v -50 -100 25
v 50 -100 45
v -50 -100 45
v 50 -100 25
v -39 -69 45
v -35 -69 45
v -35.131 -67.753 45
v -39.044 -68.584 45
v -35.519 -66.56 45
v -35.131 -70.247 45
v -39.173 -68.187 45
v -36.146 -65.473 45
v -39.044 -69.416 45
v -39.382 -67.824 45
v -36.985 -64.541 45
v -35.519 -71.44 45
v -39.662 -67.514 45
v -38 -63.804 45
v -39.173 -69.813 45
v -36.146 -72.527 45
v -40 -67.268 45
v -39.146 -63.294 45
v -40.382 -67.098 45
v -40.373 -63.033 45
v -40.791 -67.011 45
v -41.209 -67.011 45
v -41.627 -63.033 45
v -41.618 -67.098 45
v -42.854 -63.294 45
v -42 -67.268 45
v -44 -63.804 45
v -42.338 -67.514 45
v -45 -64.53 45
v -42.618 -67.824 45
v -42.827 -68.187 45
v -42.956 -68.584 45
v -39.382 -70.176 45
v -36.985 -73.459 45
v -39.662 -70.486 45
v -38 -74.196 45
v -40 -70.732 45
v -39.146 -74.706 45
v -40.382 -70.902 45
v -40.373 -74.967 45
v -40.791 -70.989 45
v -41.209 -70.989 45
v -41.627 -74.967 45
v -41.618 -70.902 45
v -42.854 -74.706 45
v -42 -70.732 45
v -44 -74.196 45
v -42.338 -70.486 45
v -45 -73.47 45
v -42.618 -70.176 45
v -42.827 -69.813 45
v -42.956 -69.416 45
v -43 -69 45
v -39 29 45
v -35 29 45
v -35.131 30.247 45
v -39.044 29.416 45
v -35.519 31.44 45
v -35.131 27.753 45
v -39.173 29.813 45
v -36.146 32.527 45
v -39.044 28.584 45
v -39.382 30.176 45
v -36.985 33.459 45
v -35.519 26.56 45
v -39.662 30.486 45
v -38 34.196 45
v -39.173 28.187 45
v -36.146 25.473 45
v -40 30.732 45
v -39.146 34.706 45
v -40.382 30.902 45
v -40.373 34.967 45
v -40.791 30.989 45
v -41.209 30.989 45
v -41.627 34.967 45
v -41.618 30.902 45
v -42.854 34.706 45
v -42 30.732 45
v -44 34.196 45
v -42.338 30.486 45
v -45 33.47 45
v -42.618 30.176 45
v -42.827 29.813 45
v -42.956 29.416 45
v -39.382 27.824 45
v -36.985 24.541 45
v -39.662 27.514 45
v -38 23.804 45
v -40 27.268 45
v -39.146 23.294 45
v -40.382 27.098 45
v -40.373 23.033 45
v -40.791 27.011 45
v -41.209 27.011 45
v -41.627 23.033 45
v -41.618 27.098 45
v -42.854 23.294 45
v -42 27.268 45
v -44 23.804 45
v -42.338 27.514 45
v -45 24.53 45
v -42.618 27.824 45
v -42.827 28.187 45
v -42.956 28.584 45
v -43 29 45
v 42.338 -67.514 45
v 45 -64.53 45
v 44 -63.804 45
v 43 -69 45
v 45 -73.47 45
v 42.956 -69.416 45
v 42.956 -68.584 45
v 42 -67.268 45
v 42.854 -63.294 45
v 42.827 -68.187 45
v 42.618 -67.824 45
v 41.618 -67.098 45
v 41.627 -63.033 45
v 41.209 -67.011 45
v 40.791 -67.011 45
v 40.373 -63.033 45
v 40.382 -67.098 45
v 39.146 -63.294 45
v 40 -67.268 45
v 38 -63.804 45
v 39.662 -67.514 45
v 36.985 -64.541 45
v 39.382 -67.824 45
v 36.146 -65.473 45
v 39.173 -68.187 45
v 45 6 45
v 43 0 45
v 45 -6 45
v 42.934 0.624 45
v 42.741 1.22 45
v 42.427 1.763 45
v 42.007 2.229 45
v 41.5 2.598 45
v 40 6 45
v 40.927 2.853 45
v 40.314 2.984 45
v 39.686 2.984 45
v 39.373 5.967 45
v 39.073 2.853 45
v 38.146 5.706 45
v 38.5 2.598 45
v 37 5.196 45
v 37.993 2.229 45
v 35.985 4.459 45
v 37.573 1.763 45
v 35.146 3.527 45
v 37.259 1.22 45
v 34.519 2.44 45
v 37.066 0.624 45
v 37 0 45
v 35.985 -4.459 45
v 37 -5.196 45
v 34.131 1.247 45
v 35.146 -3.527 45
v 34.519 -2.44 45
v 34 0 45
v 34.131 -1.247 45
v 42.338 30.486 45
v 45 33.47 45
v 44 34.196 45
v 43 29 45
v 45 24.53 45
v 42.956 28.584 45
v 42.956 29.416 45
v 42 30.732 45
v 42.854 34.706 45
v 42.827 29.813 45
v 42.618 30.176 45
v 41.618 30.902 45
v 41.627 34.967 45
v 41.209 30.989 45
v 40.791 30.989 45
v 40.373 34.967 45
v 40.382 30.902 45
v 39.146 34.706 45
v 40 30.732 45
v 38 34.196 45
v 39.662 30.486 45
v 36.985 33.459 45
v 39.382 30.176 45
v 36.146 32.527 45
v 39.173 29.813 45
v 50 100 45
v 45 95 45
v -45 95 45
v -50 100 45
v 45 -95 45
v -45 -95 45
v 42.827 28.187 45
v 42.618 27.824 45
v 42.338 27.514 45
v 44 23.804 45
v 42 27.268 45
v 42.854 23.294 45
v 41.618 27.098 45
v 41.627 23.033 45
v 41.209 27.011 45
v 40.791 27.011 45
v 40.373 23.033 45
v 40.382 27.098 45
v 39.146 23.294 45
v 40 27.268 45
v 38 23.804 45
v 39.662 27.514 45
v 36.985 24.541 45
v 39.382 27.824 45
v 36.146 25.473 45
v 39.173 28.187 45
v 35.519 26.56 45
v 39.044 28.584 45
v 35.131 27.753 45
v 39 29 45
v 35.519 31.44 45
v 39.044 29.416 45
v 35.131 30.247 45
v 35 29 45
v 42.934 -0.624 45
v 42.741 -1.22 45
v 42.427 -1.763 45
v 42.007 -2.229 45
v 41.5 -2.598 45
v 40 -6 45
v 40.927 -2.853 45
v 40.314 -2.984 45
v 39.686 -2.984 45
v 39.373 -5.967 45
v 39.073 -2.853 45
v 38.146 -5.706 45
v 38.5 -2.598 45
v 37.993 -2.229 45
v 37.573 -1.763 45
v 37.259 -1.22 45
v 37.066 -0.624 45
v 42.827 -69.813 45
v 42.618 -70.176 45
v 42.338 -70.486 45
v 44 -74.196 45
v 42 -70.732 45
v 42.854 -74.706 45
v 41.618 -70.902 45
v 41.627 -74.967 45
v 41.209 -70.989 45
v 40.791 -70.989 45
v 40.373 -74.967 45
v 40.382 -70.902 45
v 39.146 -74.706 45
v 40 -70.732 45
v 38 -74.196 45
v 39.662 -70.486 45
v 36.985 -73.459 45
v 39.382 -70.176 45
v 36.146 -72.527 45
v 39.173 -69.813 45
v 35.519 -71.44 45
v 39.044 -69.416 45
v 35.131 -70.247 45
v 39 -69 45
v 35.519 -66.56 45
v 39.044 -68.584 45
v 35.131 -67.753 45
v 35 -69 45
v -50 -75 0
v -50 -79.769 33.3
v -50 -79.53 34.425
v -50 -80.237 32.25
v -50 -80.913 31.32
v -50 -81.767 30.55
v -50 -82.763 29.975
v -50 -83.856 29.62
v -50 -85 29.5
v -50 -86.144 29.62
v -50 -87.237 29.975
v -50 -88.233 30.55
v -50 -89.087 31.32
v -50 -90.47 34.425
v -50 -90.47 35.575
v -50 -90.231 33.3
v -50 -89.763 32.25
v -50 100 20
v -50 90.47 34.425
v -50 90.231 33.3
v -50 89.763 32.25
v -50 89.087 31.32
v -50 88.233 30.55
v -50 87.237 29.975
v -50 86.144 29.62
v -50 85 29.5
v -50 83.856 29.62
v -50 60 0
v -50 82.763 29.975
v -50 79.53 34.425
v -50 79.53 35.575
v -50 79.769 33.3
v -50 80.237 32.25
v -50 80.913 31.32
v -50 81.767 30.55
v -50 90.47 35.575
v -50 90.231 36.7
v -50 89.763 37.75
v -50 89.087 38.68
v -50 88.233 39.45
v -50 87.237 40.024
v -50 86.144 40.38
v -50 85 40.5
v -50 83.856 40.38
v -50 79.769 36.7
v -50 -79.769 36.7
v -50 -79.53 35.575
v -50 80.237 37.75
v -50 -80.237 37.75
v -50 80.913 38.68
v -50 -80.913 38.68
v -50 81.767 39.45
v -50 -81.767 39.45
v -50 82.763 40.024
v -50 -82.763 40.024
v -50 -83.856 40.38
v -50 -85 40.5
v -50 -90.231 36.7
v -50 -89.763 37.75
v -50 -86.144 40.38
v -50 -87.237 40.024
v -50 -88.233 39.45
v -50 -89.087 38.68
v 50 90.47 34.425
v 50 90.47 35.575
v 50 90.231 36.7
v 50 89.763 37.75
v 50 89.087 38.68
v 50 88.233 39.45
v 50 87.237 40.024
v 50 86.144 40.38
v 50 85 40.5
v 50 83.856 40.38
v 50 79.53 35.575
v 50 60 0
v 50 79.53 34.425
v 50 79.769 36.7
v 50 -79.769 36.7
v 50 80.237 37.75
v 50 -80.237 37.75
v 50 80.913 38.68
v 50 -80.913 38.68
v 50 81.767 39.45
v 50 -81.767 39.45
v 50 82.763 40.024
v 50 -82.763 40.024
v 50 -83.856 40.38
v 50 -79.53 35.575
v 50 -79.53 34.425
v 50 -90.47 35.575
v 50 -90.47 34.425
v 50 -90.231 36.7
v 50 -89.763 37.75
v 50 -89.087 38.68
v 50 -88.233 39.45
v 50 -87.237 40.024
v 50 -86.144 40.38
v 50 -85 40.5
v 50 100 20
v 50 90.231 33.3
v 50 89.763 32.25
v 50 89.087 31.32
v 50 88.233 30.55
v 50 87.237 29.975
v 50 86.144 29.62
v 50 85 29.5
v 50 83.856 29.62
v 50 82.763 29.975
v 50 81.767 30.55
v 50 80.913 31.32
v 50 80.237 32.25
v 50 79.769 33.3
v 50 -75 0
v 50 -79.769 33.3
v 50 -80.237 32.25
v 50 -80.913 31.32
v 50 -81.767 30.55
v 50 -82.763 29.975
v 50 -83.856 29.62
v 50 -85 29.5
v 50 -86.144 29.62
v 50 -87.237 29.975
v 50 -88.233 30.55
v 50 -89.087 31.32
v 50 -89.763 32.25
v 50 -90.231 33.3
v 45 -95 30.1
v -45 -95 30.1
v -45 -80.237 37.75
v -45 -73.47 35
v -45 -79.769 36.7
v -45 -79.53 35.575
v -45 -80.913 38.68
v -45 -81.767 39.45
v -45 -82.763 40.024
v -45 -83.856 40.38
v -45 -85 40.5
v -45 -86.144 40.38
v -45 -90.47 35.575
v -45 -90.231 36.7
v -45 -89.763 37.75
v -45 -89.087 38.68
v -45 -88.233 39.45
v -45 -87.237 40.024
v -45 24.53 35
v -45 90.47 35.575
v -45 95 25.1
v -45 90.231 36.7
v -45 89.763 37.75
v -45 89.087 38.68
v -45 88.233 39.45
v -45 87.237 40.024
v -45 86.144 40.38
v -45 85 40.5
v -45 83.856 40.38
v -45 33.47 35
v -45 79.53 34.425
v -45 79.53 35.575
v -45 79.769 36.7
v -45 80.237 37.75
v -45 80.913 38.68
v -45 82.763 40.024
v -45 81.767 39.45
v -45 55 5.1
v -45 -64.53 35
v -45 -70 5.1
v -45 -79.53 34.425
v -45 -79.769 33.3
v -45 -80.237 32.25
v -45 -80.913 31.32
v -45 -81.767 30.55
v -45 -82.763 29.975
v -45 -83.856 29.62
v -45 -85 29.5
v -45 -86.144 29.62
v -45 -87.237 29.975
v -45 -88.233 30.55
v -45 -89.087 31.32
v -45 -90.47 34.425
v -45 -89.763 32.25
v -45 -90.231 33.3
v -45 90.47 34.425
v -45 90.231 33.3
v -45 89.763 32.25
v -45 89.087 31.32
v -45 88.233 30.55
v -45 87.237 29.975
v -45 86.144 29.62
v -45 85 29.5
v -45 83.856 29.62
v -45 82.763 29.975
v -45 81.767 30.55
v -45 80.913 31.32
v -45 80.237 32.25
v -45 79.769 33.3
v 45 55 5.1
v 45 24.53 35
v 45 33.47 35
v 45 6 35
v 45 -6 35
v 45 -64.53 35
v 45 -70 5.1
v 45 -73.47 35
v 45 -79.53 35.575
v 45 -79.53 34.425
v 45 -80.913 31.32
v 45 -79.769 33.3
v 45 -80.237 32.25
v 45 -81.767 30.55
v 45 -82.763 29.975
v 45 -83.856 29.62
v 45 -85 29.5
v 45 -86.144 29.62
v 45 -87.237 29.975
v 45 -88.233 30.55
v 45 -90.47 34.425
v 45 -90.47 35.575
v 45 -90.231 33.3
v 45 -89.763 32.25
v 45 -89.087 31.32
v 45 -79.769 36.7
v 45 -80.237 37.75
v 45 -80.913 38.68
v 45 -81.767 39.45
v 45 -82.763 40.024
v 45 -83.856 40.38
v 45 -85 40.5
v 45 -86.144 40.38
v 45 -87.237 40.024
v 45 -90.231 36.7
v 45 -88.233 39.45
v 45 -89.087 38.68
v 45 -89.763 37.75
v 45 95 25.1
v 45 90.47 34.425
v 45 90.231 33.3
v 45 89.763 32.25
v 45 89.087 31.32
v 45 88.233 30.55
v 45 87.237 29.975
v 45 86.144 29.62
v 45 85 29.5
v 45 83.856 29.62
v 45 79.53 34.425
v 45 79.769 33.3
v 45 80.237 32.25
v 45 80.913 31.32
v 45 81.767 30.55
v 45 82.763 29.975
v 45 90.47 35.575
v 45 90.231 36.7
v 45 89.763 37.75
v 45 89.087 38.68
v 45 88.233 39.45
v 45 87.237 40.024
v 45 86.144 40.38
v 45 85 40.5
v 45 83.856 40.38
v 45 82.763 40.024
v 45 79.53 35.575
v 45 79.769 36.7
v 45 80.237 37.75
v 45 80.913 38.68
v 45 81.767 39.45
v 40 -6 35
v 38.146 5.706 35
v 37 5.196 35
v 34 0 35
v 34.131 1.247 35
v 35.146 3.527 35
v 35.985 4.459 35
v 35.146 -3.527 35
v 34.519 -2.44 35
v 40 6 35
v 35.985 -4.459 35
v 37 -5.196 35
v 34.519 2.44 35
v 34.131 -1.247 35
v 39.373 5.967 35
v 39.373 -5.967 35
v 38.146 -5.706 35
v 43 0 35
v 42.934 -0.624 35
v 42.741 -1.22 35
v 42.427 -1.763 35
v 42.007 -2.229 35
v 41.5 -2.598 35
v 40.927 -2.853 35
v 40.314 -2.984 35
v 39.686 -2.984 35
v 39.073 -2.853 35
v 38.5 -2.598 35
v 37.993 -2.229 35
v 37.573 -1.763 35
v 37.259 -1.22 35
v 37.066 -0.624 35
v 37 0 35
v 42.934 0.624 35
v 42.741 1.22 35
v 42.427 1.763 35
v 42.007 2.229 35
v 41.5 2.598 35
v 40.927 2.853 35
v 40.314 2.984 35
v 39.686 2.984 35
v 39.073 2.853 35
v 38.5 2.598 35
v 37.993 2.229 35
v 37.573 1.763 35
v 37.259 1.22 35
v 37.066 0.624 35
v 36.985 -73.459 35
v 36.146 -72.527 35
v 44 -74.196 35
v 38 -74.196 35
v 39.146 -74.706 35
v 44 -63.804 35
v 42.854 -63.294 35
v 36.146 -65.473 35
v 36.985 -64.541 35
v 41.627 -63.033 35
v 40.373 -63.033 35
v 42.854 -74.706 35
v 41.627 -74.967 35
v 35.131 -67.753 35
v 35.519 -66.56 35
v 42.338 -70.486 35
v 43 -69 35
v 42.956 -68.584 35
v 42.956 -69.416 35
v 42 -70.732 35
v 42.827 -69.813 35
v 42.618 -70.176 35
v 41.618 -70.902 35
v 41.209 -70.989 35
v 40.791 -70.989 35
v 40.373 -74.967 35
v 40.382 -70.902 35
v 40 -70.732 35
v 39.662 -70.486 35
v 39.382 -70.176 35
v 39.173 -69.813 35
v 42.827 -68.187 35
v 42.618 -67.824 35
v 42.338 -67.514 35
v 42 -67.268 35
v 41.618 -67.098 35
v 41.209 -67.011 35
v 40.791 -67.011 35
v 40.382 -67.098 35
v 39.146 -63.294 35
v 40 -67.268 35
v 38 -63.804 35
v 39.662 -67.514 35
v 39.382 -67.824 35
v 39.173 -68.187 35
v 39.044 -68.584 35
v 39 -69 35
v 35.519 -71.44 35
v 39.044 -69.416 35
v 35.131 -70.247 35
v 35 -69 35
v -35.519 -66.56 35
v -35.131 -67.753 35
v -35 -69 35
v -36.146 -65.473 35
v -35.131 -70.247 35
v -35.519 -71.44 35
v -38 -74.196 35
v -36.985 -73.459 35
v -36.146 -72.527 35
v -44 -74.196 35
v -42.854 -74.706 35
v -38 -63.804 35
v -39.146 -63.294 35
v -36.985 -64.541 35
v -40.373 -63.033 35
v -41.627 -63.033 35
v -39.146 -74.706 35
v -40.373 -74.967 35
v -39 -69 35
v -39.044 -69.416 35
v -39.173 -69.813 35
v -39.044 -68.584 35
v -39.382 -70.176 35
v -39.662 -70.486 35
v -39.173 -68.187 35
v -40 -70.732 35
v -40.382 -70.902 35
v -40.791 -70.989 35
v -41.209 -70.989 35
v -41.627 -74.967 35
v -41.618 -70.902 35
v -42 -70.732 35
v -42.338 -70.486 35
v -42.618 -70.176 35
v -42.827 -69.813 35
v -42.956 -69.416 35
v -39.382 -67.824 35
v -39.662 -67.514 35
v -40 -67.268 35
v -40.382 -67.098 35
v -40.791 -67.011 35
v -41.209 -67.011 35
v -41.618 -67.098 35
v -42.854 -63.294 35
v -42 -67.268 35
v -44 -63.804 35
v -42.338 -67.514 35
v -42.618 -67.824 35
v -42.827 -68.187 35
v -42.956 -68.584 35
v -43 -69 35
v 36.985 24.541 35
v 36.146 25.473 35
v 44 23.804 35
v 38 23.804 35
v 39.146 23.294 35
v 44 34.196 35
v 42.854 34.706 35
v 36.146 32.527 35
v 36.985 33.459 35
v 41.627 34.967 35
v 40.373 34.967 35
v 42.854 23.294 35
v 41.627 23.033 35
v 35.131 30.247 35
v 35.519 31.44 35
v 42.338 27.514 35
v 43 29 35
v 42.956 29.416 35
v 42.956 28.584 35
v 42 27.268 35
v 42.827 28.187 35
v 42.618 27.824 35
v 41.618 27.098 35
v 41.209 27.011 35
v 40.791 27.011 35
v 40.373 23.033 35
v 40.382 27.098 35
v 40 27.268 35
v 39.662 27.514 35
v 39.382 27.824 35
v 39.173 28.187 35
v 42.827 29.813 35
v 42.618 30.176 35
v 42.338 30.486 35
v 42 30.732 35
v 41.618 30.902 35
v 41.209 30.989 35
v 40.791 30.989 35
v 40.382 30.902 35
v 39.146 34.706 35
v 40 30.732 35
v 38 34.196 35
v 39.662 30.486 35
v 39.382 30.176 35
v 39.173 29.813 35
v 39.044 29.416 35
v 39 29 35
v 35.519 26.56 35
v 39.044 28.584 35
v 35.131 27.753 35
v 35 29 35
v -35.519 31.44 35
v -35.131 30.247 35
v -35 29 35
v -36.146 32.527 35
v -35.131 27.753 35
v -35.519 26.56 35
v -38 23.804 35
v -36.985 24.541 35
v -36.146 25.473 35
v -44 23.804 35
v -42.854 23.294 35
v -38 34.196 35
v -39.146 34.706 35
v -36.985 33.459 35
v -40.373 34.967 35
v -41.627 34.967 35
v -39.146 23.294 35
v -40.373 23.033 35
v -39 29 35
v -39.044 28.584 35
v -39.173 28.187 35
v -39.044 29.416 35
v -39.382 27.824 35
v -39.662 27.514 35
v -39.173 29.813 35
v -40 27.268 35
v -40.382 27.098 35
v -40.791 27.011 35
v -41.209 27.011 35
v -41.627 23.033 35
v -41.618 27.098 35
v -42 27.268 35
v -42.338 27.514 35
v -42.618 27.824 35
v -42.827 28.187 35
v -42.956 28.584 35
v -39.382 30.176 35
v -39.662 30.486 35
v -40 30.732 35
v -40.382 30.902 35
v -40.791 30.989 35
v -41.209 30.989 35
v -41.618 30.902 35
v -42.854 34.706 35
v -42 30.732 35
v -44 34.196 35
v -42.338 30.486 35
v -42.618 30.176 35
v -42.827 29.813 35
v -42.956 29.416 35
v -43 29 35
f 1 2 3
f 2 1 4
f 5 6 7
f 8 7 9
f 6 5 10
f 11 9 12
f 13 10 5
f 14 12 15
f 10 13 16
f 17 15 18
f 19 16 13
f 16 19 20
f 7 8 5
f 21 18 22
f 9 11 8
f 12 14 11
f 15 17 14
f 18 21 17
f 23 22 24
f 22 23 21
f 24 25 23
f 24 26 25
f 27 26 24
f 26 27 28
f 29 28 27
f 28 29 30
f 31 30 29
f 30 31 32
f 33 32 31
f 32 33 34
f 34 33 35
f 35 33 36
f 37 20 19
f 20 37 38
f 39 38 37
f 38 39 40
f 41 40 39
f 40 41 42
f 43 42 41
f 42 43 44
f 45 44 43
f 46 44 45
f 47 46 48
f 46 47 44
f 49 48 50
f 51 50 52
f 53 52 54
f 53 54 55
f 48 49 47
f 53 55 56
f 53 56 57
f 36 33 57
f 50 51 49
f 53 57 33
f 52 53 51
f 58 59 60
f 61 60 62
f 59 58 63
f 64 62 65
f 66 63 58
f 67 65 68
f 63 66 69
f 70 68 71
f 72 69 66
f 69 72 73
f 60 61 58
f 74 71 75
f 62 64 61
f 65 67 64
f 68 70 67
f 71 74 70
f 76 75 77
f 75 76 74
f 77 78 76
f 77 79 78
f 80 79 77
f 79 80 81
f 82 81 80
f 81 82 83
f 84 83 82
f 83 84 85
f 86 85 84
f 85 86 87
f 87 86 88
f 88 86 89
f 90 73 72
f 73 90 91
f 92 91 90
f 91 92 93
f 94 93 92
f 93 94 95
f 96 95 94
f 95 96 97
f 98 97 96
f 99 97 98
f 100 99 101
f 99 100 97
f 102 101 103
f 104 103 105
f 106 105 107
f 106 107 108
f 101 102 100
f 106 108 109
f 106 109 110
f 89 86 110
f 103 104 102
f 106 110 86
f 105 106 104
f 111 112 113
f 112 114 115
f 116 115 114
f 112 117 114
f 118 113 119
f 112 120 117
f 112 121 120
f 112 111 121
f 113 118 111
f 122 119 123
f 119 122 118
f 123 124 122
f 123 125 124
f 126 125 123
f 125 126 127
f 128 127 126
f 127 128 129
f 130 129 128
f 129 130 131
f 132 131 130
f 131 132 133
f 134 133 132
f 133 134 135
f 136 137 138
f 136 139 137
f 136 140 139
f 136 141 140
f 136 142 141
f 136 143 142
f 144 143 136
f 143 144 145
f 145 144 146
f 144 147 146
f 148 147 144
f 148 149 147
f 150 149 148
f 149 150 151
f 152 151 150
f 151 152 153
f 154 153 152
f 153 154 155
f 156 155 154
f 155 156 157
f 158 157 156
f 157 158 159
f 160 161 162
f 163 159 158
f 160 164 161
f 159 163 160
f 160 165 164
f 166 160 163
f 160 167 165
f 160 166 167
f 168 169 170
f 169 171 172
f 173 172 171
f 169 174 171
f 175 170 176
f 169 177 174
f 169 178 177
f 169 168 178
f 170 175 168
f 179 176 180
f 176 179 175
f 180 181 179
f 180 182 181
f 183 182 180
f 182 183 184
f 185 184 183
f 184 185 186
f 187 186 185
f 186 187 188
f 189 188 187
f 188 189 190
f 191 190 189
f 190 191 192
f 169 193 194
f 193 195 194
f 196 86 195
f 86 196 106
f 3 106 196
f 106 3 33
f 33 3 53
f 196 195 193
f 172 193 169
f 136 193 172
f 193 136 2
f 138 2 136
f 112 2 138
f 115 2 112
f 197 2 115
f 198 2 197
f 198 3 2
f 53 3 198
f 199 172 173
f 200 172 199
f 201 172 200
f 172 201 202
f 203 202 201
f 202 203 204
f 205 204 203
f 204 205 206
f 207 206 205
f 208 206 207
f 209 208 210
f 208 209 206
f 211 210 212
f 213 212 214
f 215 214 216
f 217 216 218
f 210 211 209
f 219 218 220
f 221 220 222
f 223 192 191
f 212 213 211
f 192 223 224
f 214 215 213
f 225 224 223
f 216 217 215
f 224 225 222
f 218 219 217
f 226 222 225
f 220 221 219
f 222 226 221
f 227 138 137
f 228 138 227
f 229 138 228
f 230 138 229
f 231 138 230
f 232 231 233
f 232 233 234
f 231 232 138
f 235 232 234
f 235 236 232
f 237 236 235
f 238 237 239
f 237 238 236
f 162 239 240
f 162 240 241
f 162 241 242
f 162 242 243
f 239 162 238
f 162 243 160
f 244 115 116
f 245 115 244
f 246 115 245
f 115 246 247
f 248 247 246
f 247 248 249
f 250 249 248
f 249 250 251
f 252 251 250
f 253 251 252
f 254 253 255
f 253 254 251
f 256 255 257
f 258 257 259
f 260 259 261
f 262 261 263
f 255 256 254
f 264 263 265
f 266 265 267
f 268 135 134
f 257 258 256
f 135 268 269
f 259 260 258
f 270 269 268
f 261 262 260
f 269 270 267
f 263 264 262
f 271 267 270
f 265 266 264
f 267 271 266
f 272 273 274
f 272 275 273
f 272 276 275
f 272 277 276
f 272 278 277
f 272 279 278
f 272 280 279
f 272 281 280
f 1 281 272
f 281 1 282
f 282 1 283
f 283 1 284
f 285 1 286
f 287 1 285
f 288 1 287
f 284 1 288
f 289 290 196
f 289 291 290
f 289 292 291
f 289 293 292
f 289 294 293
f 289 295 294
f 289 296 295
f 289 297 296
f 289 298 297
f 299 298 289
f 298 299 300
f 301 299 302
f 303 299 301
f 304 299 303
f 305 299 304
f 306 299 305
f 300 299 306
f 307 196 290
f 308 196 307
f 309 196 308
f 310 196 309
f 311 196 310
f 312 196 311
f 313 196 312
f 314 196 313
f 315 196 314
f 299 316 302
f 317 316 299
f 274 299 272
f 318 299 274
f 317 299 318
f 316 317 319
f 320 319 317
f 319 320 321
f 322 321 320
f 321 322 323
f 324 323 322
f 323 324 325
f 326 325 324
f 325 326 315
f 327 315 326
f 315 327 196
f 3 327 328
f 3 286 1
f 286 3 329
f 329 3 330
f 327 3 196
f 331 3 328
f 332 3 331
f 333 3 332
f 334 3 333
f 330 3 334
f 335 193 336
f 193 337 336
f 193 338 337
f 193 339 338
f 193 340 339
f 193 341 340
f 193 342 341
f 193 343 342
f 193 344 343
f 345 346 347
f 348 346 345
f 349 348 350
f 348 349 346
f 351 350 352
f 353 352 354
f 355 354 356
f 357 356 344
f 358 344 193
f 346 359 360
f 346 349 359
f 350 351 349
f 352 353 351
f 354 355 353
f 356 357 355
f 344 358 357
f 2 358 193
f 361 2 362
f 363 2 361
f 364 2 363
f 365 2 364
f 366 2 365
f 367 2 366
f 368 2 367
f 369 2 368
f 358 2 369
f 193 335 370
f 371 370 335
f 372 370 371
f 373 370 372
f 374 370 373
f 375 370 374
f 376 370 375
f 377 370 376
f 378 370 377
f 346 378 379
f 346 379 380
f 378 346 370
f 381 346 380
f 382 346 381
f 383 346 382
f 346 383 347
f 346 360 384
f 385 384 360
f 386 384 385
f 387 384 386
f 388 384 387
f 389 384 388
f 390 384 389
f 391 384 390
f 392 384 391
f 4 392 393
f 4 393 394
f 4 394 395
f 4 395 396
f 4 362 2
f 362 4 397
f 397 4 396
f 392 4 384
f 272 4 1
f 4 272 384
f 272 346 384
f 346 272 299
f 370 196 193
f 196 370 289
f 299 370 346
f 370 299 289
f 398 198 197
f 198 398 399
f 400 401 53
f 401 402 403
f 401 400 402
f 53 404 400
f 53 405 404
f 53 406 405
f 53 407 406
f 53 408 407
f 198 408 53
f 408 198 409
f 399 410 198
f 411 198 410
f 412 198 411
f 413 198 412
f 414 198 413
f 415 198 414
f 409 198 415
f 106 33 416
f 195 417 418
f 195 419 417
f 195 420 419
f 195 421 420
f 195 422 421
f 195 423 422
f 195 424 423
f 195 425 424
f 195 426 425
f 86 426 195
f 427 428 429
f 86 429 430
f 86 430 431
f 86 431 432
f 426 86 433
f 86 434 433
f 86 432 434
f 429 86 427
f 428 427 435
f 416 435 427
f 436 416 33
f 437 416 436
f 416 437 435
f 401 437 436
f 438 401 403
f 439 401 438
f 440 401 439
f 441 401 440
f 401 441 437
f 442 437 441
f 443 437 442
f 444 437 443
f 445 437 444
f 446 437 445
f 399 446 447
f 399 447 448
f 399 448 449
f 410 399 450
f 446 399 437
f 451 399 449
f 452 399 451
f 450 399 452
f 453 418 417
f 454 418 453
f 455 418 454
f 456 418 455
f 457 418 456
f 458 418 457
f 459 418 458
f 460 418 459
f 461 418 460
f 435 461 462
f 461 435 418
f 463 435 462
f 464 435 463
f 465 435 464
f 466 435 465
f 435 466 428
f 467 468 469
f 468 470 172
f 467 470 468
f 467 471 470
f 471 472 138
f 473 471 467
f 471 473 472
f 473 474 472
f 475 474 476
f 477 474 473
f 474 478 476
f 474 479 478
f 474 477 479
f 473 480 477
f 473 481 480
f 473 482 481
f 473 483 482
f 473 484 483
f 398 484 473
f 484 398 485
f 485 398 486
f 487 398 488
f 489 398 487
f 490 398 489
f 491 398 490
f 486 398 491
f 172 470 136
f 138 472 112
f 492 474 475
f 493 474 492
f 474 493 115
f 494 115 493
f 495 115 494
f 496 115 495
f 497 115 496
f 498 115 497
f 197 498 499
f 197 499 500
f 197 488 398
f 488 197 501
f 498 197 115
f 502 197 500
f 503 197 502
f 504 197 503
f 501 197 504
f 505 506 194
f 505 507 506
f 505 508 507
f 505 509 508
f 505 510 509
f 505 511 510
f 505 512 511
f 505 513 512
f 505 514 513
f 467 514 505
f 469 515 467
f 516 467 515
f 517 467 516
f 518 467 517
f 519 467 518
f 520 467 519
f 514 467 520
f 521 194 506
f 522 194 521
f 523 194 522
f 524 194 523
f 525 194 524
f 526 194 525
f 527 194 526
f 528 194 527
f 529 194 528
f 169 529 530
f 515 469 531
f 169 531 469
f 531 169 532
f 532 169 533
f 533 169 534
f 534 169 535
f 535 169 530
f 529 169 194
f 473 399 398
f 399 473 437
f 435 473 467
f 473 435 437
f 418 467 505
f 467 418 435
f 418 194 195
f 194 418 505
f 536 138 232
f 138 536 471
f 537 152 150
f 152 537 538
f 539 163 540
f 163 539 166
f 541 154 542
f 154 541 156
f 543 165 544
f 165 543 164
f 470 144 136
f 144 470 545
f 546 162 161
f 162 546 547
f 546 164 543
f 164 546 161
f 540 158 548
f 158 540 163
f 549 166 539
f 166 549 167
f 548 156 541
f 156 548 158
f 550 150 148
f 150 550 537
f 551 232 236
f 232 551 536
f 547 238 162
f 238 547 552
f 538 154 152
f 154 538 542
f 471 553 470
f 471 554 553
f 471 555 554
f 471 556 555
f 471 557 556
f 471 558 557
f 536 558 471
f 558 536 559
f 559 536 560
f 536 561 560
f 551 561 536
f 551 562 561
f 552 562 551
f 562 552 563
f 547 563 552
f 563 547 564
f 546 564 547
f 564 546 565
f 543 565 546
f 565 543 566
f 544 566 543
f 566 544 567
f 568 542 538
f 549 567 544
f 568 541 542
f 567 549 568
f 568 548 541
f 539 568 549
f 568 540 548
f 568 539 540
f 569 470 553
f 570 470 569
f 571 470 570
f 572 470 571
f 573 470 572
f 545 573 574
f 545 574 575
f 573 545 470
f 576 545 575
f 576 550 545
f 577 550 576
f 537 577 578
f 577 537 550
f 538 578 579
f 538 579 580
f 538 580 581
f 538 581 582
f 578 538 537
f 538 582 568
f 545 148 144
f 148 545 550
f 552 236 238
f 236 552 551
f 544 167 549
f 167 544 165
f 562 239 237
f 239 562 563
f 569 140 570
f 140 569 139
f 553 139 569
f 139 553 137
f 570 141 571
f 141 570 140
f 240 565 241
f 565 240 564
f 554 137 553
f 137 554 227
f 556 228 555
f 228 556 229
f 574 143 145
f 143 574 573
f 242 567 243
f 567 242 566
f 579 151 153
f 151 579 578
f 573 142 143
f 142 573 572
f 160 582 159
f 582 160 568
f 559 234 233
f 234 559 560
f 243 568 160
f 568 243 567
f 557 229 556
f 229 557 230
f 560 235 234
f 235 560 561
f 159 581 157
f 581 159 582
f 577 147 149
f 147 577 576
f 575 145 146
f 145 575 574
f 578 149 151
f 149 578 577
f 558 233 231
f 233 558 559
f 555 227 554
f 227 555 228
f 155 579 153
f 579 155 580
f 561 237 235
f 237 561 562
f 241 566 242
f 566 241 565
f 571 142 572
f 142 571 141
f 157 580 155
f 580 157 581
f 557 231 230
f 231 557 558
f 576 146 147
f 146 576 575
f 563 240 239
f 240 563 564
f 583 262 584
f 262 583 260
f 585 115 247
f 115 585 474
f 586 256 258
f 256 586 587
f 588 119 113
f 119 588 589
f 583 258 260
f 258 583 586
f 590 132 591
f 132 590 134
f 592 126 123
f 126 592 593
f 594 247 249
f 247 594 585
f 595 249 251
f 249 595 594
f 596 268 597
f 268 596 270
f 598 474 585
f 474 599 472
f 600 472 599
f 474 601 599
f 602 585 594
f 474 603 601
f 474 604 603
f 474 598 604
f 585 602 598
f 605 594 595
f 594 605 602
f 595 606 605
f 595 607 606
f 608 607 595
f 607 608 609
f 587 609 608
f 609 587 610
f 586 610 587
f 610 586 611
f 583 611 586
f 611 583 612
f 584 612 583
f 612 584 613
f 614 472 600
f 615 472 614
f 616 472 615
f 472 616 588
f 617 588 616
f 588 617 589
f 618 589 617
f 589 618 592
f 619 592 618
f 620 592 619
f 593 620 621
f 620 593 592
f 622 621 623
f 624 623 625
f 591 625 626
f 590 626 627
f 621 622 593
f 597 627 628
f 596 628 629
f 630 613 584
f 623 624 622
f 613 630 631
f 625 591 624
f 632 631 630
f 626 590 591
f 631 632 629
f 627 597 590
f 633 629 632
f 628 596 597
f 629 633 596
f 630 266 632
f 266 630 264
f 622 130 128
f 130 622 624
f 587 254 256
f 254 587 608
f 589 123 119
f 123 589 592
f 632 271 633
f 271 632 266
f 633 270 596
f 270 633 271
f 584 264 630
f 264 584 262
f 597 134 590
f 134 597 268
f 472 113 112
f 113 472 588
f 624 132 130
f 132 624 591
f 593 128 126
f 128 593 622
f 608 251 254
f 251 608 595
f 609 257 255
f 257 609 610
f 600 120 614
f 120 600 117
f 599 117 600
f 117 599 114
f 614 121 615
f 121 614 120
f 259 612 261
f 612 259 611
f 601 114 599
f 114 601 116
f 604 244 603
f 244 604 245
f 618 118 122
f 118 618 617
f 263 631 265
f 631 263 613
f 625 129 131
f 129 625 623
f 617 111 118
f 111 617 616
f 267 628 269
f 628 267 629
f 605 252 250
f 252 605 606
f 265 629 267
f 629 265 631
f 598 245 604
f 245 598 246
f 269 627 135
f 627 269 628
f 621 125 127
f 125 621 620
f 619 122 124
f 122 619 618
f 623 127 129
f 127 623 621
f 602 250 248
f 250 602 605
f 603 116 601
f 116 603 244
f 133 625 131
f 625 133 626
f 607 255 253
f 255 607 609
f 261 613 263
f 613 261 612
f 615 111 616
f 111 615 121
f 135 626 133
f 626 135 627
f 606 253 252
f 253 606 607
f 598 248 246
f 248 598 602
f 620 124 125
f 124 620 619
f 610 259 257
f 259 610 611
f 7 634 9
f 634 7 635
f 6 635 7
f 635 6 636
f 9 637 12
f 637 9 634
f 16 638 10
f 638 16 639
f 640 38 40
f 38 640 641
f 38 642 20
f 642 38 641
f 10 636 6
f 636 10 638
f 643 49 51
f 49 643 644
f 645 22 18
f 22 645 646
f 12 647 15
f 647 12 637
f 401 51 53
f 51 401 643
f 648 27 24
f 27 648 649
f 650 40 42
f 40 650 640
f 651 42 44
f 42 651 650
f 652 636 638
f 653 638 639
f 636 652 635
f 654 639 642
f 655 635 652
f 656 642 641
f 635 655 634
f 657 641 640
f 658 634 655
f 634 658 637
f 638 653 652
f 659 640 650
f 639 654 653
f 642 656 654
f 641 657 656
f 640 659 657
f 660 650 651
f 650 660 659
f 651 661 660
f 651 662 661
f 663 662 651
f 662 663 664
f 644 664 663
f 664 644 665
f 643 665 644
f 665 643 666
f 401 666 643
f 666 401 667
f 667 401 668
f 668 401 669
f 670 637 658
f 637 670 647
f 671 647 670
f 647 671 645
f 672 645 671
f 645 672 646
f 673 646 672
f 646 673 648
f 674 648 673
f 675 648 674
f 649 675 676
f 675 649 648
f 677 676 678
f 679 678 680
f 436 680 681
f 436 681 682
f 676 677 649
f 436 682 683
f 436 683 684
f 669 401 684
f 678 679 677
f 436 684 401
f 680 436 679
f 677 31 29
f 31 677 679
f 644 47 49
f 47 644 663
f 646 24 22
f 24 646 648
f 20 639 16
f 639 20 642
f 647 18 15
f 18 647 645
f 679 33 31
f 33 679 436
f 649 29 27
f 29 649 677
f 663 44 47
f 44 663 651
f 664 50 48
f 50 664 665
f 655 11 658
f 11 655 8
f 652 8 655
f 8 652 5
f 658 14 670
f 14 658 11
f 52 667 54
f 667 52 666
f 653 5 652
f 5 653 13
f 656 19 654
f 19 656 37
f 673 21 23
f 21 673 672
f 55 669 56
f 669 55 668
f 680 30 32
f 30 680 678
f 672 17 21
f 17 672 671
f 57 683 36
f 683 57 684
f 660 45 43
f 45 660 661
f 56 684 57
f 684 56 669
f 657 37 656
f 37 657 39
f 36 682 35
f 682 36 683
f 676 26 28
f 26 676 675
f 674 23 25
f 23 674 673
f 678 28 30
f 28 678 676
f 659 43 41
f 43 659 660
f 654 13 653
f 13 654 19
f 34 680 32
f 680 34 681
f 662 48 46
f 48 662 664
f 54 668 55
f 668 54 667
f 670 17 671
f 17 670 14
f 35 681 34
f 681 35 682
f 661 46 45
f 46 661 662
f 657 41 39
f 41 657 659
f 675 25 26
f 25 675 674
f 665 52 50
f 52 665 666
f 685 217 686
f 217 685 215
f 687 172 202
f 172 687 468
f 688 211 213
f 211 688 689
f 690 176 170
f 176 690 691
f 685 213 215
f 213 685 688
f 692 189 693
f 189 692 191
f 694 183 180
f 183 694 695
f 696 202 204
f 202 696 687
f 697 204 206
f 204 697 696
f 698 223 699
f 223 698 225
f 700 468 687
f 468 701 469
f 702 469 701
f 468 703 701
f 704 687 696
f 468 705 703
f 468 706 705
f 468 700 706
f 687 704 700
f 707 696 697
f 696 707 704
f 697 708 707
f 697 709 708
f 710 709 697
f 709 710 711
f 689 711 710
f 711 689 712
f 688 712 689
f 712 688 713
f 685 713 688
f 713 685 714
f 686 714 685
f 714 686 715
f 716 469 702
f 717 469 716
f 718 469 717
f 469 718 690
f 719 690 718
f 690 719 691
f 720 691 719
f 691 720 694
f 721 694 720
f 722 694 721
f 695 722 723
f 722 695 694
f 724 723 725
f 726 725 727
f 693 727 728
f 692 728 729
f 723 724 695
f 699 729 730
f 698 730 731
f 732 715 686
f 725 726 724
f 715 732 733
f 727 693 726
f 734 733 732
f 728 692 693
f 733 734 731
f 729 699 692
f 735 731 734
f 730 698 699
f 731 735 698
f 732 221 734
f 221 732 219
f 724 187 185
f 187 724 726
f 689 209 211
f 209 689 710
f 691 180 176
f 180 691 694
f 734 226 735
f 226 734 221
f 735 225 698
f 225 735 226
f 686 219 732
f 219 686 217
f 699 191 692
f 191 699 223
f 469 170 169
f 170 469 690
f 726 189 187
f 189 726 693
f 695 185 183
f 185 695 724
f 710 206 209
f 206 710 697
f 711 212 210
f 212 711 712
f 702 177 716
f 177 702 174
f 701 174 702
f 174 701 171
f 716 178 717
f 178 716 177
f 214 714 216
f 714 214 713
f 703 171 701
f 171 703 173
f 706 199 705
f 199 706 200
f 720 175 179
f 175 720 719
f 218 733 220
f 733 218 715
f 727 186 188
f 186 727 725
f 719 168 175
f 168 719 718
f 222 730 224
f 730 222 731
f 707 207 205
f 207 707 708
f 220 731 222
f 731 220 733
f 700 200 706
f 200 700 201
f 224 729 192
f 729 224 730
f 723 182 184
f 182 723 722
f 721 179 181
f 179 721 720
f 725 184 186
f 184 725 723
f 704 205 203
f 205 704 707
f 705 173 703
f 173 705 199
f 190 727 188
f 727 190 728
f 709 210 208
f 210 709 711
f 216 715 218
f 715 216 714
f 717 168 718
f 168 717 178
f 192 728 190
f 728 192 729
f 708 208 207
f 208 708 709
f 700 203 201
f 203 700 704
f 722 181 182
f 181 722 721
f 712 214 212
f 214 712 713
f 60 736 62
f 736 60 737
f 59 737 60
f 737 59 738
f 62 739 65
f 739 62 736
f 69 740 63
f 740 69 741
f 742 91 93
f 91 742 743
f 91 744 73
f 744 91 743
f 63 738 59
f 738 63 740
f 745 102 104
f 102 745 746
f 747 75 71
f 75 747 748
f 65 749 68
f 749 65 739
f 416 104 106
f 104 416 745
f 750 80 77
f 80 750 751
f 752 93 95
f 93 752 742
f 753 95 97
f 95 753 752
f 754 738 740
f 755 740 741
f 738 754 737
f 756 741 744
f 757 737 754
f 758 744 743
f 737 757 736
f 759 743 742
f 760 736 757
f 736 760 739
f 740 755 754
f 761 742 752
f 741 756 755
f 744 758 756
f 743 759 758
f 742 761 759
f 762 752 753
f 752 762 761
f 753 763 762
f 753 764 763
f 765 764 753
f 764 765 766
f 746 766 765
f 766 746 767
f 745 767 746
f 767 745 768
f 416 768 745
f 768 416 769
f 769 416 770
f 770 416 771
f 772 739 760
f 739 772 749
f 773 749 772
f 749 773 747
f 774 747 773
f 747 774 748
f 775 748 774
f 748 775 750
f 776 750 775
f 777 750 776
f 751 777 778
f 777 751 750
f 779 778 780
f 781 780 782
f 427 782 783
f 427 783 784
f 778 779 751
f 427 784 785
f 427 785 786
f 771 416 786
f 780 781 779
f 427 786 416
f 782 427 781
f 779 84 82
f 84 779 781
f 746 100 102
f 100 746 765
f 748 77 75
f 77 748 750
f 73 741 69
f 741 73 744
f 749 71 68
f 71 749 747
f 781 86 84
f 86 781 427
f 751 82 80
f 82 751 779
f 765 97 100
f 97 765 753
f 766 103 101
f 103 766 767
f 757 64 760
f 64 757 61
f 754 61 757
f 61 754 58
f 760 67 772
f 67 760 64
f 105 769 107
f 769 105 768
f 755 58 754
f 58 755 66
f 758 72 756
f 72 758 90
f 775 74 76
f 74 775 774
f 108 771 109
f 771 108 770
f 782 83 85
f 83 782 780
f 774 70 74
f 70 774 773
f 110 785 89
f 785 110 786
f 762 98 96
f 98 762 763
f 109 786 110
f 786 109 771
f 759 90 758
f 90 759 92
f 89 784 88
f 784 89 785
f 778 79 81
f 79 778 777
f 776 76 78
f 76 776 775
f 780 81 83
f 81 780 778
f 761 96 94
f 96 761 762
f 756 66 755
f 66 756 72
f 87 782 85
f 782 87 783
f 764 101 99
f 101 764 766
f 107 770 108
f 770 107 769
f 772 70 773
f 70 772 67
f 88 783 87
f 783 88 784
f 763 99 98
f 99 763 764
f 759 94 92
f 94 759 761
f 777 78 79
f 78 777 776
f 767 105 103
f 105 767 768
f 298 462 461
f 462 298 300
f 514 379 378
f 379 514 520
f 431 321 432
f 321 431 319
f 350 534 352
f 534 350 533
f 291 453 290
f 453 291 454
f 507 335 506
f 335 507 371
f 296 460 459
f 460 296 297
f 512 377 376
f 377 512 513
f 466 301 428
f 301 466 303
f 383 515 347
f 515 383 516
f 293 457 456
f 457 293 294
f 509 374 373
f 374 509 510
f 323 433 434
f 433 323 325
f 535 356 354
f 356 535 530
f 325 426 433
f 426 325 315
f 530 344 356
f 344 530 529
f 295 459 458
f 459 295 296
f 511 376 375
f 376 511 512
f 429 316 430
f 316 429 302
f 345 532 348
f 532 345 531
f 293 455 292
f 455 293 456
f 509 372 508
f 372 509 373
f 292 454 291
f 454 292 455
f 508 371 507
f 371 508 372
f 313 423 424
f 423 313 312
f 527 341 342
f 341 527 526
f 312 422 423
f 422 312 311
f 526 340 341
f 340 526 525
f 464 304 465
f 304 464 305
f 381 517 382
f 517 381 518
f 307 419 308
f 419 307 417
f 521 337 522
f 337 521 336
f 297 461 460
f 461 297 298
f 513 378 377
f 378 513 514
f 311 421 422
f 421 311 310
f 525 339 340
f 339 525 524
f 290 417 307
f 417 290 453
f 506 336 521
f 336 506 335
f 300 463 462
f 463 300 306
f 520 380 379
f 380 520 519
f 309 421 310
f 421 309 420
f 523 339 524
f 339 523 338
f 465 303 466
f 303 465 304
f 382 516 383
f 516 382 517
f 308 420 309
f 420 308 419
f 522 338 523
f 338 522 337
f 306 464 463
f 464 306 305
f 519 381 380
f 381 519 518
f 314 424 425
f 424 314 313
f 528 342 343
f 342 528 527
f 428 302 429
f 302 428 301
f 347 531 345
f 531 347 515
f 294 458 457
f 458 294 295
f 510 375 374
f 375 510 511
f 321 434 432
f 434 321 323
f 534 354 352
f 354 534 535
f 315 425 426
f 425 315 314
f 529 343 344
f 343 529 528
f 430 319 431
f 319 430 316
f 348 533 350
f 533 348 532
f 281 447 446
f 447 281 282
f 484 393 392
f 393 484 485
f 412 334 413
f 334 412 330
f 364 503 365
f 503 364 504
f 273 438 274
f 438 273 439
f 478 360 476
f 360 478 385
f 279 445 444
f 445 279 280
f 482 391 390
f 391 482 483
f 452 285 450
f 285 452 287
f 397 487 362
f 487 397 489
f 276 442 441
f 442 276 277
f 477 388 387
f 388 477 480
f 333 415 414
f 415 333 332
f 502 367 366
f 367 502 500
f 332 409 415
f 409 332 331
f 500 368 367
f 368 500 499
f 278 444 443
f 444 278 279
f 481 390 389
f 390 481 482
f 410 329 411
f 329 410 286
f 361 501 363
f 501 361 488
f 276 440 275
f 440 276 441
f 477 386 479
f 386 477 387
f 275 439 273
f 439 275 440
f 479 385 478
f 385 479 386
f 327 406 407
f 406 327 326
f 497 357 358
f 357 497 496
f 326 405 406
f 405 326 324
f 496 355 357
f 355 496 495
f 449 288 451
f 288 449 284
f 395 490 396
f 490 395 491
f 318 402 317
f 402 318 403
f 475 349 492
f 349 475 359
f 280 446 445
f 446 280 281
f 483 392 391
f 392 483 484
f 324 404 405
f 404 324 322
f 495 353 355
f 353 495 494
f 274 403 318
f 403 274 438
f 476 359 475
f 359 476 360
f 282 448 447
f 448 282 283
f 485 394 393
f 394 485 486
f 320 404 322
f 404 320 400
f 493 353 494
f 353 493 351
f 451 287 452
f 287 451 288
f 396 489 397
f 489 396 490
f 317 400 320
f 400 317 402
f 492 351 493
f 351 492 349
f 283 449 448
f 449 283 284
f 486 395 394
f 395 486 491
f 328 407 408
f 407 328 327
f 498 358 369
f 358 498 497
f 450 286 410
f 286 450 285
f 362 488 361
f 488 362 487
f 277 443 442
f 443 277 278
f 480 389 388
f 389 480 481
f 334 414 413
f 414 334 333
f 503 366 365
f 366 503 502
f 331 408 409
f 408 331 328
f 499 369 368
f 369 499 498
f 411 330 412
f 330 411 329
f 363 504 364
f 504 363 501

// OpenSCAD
// file: screwGrip.scad
//screwGrip();


module screwGrip(
	inset=5,
	holeRadius=10,
	thickness=10,
	depth=3,
	length=15){
	d= 0.1;
	outerRadius=holeRadius+thickness;
	difference(){
		intersection(){
			hull(){
				cylinder(h=depth,r=outerRadius);
				translate([0,-outerRadius,0])
					cube([length,outerRadius*2,depth]);
			}
			translate([-outerRadius*2,-outerRadius,0])
				cube([length+outerRadius*2,outerRadius*2,depth]);
		}
		translate([0,0,-d])
			cylinder(h=depth+2*d,r=holeRadius);
	}
}
// file: ../config.scad
bodyLength=200;
bodyWidth=100;
bodyLowerHeight=45;
bodyUpperHeight=10;

bodyThickness = 5;
bodyLowerFrontSlopeLength=40;
bodyLowerFrontSlopeHeight=20;
bodyLowerBackSlopeLength=25;
bodyLowerBackSlopeHeight=25;

bodyUpperFrontSlopeLength=60;
bodyUpperFrontSlopeHeight=6;
bodyUpperBackSlopeLength=10;
bodyUpperBackSlopeHeight=6;
holeLocations=[
	[((bodyWidth/2)-bodyThickness-6+2),-bodyLength/2+6+bodyThickness+bodyUpperBackSlopeLength*2,0],
	[-((bodyWidth/2)-bodyThickness-6+2),-bodyLength/2+6+bodyThickness+bodyUpperBackSlopeLength*2,0],
	[((bodyWidth/2)-bodyThickness-6+2),(bodyLength/2)-6-bodyThickness-bodyUpperFrontSlopeLength,0],
	[-((bodyWidth/2)-bodyThickness-6+2),(bodyLength/2)-6-bodyThickness-bodyUpperFrontSlopeLength,0]
];


//whwere the drive wheels are located

WheelWidth=35;
WheelRadius=20;
WheelInnerGroveWidth=6;
WheelInnerBevelDepth= 3;
WheelInnerBevelWidth=2;
WheelOuterBevelWidth=2;
WheelOuterBevelDepth=1;


wheelDrivePositionZ=35;
wheelDrivePositionY=85;
axilRadius=5;
axilClearance=0.5;
axilLength=40;


wheelClearance=0.5;
d=0.1;
$fn=30;
// main file
include <../config.scad>

use <screwGrip.scad>

lowerBodySection();
//translate([0,0,bodyLowerHeight+100])
	//upperBodySection();

module lowerBodySection(){
	difference(){
		union(){
			holloweAngledBlockSection(
			length=bodyLength, 
			width=bodyWidth, 
		 	height=bodyLowerHeight,
		 	insetFronty=bodyLowerFrontSlopeLength,
		 	insetFrontz=bodyLowerFrontSlopeHeight, 
		 	insetBacky=bodyLowerBackSlopeLength,
		 	insetBackz=bodyLowerBackSlopeHeight);
		   // pillars
			
			translate([(bodyWidth/2)-bodyThickness-5,0,bodyLowerHeight-10]){
				screwGrip(depth=10,holeRadius=3,length=5,thickness=3);
			}
			
			translate([0,0,bodyLowerHeight-10])
				for(index=[0:len(holeLocations)-1]){
					translate(holeLocations[index]){	
						difference(){
						cylinder(h=10,r=6);
						translate([0,0,-d])
							cylinder(h=10+2*d,r=2);
						}
					}
				}
		}
		translate([-bodyWidth/2-d,wheelDrivePositionY,wheelDrivePositionZ])
			rotate(v=[0,1,0], a= 90)
				cylinder(h=bodyWidth+2*d, r=axilRadius+axilClearance);
		translate([-bodyWidth/2-d,-wheelDrivePositionY,wheelDrivePositionZ])
			rotate(v=[0,1,0], a= 90)
				cylinder(h=bodyWidth+2*d, r=axilRadius+axilClearance);
	}
}

module upperBodySection(){
	difference(){
		union(){
		translate([0,0,bodyUpperHeight])
			mirror([0,0,1])
				holloweAngledBlockSection(
						length=bodyLength, 
						width=bodyWidth, 
					 	height=bodyUpperHeight,
					 	insetFronty=bodyUpperFrontSlopeLength,
					 	insetFrontz=bodyUpperFrontSlopeHeight, 
					 	insetBacky=bodyUpperBackSlopeLength,
					 	insetBackz=bodyUpperBackSlopeHeight);
			// pillars
			for(index=[0:len(holeLocations)-1]){
				translate(holeLocations[index]){
					cylinder(h=bodyUpperHeight,r=6);
				}
			}
		}	
		//cut outs
		for(index=[0:len(holeLocations)-1]){
				translate(holeLocations[index]){
					screwCutout(height=bodyUpperHeight, radius=6);				
				}
					
		}
	}
}

module screwCutout(radius=6, innerRadius=2, screwRadius=0.5, ,wallThickness =1, height=20){
		translate([0,0,wallThickness]){
			cylinder(h=height+d,r=innerRadius);
		}
		translate([0,0,-d]){
			cylinder(h=height+d,r=screwRadius);
		}
		translate([0,0,height-5]){
			cylinder(h=5+d,r2=radius, r1=innerRadius);
		}
}

module holloweAngledBlockSection(
		length, 
		width, 
		height,
		insetFronty,
		insetFrontz,
		insetBacky,
		insetBackz){
	difference(){
		angledBlockSection(length=length, 
					 width=width, 
					 height=height,
					 insetFronty=insetFronty,
					 insetFrontz=insetFrontz, 
					 insetBacky=insetBacky,
					 insetBackz=insetBackz);
	
		translate([0,0,bodyThickness+d])
			angledBlockSection(length=length-bodyThickness*2, 
					 width=width-bodyThickness*2, 
					 height=height-bodyThickness,
					 insetFronty=insetFronty,
					 insetFrontz=insetFrontz, 
					 insetBacky=insetBacky,
					 insetBackz=insetBackz);
	}
}

module angledBlockSection(length, 
								 width, 
								 height,
								 insetFronty,
								 insetFrontz,
								 insetBacky,
								 insetBackz){
	hull(){
		//bottom front
		translate([-width/2,-d+length/2-insetFronty,0])
			cube([width,d,d]);

		//bottom back
		translate([-width/2,-length/2+insetBacky,0])
			cube([width,d,d]);

		//front
		translate([-width/2,-d+length/2,insetFrontz])
			cube([width,d,d]);

		//back
		translate([-width/2,-length/2,insetBackz])
			cube([width,d,d]);
		
		//upper front
		translate([-width/2,-d+length/2,height-d])
			cube([width,d,d]);

		//upper back
		translate([-width/2,-length/2,height-d])
			cube([width,d,d]);
	}
}
